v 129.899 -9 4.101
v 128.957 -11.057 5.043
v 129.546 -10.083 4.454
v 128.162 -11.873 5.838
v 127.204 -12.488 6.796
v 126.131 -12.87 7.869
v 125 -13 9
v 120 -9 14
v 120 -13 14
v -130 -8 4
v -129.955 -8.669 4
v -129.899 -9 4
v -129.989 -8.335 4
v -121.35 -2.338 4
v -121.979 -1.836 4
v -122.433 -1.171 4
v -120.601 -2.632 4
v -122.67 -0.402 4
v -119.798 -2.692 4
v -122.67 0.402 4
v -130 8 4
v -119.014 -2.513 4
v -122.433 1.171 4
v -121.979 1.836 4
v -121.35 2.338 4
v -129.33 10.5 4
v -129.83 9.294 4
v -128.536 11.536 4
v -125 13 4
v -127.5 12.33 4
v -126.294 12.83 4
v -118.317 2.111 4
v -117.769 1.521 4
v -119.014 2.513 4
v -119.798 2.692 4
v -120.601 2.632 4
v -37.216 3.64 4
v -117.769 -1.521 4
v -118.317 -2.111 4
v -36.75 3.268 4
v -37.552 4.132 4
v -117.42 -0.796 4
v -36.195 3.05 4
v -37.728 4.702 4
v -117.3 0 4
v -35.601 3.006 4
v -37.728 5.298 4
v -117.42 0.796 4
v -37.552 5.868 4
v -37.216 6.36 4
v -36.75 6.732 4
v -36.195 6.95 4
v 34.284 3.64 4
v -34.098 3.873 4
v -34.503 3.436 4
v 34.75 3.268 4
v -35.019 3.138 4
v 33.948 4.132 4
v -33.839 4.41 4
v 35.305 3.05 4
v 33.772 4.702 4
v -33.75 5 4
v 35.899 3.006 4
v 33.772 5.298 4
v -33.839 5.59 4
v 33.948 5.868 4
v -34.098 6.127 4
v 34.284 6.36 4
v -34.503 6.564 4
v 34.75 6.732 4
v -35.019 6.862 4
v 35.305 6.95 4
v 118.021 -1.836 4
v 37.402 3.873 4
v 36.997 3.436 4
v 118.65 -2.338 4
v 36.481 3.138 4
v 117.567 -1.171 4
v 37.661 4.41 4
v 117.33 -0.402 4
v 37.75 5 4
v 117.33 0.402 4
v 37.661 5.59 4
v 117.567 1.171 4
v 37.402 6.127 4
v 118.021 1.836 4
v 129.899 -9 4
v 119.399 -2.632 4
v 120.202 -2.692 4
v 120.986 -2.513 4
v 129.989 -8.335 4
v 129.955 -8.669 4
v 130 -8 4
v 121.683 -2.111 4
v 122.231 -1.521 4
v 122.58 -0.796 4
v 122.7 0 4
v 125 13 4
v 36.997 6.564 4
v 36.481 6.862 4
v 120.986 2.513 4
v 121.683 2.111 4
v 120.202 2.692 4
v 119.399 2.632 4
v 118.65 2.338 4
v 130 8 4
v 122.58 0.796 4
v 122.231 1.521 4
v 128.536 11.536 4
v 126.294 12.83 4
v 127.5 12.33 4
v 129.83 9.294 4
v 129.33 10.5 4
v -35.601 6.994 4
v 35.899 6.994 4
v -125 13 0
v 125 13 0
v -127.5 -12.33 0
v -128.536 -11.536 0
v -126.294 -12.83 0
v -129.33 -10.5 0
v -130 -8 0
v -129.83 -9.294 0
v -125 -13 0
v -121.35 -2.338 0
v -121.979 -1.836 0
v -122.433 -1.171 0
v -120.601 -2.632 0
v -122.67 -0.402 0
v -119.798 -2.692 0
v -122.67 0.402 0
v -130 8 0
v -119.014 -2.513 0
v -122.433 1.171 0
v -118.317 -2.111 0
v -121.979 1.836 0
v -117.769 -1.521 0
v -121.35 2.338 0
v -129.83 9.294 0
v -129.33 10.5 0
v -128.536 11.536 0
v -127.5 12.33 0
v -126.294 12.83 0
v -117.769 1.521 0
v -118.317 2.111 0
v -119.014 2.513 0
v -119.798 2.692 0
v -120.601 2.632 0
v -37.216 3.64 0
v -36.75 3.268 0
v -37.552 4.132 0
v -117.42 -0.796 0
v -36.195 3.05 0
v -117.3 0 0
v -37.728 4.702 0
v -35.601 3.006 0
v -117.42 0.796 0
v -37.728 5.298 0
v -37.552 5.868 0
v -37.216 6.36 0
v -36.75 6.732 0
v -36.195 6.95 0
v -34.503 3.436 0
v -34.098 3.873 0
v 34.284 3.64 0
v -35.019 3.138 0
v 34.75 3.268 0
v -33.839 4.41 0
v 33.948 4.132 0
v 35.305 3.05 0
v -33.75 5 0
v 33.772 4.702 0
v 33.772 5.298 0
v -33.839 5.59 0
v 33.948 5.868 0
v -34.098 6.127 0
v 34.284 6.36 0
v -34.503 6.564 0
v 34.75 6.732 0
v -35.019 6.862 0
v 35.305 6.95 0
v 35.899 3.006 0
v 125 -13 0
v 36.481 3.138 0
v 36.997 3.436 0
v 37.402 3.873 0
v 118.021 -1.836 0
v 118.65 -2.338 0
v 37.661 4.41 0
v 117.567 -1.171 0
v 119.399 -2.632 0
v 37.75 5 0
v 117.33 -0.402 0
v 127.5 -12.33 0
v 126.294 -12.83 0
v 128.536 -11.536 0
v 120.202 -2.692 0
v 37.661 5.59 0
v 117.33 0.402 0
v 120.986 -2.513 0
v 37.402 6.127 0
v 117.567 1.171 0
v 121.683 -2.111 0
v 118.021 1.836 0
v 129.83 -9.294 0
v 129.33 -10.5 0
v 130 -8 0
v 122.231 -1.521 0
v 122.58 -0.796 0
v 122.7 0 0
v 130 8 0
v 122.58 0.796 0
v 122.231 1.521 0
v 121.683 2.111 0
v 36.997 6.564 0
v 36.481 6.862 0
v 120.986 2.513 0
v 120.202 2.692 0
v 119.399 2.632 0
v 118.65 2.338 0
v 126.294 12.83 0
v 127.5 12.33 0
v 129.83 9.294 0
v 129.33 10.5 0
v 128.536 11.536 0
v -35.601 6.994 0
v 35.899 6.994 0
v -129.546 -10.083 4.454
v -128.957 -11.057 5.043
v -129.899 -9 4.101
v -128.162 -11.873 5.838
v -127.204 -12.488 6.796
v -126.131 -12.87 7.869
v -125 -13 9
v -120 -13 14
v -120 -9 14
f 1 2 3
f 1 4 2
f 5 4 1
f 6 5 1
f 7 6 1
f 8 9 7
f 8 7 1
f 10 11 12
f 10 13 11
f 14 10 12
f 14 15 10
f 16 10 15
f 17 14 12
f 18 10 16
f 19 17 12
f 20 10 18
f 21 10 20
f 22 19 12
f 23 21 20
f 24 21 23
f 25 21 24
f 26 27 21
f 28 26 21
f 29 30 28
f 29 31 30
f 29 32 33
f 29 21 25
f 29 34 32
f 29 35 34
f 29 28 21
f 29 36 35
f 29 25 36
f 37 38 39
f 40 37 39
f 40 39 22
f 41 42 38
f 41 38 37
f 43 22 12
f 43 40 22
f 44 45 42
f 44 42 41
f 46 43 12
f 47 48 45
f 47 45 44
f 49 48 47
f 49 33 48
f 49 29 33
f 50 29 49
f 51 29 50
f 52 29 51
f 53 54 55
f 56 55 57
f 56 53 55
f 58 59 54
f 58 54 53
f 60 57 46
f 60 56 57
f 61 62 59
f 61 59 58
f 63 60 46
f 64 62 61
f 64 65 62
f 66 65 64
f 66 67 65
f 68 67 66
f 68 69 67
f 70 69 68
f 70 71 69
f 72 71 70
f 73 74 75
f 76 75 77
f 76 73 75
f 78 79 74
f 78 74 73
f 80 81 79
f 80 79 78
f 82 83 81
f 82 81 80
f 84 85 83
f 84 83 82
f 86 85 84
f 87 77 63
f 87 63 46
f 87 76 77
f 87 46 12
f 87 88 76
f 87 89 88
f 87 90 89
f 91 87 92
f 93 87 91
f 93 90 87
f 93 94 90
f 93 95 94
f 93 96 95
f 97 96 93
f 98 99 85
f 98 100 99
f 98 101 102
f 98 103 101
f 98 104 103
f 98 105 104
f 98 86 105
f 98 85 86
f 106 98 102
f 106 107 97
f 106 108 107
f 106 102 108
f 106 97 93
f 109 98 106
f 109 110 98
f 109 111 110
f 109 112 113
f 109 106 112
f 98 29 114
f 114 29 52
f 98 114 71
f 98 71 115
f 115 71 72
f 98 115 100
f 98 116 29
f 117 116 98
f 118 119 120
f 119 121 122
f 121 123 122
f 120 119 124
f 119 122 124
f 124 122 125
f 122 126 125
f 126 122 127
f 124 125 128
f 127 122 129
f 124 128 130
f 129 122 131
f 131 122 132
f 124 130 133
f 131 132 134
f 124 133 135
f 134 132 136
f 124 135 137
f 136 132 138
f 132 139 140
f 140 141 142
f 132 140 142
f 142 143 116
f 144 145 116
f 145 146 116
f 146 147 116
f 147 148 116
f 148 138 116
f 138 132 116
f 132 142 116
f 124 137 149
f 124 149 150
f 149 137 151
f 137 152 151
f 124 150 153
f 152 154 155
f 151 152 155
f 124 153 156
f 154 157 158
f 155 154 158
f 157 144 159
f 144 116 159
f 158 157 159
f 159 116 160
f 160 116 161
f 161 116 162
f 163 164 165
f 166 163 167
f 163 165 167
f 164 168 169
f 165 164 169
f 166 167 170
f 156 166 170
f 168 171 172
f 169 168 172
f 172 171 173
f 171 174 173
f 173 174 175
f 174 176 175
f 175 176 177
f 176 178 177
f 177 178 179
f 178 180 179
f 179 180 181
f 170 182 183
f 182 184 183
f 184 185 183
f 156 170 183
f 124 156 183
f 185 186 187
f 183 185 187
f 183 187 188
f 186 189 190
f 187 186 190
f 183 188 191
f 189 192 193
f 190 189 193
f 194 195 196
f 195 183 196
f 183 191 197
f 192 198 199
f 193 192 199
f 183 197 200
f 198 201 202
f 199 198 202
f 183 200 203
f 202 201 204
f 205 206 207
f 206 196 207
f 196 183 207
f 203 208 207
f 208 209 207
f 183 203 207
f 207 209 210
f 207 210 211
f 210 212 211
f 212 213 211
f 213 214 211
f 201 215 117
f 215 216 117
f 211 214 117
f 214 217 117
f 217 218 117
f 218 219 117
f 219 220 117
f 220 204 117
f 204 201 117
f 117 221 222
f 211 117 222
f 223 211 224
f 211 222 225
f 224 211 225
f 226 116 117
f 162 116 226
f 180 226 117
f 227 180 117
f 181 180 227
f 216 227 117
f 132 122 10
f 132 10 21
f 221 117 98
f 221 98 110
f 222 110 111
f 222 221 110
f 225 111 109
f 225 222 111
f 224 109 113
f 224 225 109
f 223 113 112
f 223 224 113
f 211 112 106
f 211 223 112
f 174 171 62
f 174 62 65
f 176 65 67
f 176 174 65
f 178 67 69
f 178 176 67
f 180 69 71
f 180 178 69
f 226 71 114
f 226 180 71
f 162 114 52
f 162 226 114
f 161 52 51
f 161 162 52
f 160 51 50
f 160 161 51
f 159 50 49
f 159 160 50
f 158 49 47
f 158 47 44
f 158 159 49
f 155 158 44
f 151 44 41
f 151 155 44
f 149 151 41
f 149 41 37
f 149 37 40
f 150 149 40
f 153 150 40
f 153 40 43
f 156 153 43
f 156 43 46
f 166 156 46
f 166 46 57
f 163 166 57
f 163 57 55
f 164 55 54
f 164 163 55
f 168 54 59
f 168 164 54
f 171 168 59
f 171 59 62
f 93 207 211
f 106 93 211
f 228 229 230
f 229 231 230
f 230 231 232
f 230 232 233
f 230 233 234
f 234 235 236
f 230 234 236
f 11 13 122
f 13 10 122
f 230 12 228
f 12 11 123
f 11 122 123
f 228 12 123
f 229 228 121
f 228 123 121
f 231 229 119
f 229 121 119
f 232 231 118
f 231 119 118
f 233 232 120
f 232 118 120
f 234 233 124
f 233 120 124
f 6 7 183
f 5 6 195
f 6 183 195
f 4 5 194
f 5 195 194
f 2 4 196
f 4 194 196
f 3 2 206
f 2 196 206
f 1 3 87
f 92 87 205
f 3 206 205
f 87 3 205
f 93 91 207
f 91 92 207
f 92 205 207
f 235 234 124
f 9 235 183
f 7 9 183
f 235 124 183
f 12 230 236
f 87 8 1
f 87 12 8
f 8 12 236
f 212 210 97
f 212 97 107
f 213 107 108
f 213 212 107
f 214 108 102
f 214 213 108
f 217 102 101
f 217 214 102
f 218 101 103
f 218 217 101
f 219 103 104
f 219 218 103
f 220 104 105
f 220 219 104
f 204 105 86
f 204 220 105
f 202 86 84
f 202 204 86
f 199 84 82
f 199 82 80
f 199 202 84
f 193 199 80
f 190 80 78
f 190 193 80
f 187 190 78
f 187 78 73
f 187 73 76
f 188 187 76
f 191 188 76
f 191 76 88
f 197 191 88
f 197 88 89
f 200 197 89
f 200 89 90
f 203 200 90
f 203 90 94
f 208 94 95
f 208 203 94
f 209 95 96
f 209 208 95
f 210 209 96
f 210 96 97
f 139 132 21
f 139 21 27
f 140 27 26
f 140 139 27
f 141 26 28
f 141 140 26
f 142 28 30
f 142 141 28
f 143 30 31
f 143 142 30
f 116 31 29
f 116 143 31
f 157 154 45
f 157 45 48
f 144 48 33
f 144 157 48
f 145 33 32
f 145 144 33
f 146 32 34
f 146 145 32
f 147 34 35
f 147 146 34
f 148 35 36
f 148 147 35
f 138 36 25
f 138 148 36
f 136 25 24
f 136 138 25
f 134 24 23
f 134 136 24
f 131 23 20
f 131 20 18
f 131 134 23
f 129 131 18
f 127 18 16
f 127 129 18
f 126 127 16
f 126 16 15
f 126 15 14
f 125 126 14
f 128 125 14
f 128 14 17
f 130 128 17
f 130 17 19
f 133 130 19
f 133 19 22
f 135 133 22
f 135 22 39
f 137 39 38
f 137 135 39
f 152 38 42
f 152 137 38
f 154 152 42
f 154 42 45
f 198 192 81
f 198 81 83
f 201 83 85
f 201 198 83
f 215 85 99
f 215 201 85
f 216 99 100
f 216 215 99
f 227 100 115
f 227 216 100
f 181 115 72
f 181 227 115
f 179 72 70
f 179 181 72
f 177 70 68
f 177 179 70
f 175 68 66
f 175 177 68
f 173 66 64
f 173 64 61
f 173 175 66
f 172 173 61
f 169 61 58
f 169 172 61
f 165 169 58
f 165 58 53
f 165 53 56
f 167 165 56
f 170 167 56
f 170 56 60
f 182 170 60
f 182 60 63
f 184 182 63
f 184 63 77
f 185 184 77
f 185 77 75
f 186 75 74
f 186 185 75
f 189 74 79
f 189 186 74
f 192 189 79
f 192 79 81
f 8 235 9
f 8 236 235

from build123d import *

# Parameters (mm, degrees)
F0_W        = 260
F0_H        = 26
F0_R        = 2.7
F0_R_2      = 2
F1_DEPTH    = 4
F2_W        = 260
F2_H        = 4
F3_DEPTH    = 10
F4_SIZE     = 10
F5_T1_DEPTH = 29


# Not quite as in the source:
# - a fillet or chamfer that OpenCascade refuses, or shapes differently, is made with other operations: its cross-section is extruded or revolved along the edge and cut away or added


with BuildPart() as f1:
    # F0 (on Top) → F1 (new body)
    with BuildSketch(Plane.XY):
        Rectangle(F0_W, F0_H)
        with Locations((-120, 0)):
            Circle(F0_R, mode=Mode.SUBTRACT)
        with Locations((-35.75, 5)):
            Circle(F0_R_2, mode=Mode.SUBTRACT)
        with Locations((35.75, 5)):
            Circle(F0_R_2, mode=Mode.SUBTRACT)
        with Locations((120, 0)):
            Circle(F0_R, mode=Mode.SUBTRACT)
    extrude(amount=F1_DEPTH)

    # F2 (on face) → F3 (join)
    with BuildSketch(Plane.XY.offset(4)):
        with Locations((0, -11)):
            Rectangle(F2_W, F2_H)
    extrude(amount=F3_DEPTH)

    # F4
    f4_edges = [f1.edges().sort_by_distance(p)[0] for p in [
        (-130, -11, 14),
        (130, -11, 14),
    ]]
    chamfer(f4_edges, length=F4_SIZE)

    # F5: fillet of radius 5 on 4 edges, made by hand

    # F5_s2 → F5_t1 (cut)
    with BuildSketch(Plane.XY.offset(-12.5)):
        with BuildLine():
            ThreePointArc((125, 13), (128.5355339059, 11.5355339059), (130, 8))
            Line((130, 8), (130, 13))
            Line((130, 13), (125, 13))
        make_face()
        with BuildLine():
            ThreePointArc((125, -13), (128.5355339059, -11.5355339059), (130, -8))
            Line((130, -8), (130, -13))
            Line((130, -13), (125, -13))
        make_face()
        with BuildLine():
            ThreePointArc((-130, 8), (-128.5355339059, 11.5355339059), (-125, 13))
            Line((-125, 13), (-130, 13))
            Line((-130, 13), (-130, 8))
        make_face()
        with BuildLine():
            ThreePointArc((-130, -8), (-128.5355339059, -11.5355339059), (-125, -13))
            Line((-125, -13), (-130, -13))
            Line((-130, -13), (-130, -8))
        make_face()
    extrude(amount=F5_T1_DEPTH, mode=Mode.SUBTRACT)


solid = f1.part
